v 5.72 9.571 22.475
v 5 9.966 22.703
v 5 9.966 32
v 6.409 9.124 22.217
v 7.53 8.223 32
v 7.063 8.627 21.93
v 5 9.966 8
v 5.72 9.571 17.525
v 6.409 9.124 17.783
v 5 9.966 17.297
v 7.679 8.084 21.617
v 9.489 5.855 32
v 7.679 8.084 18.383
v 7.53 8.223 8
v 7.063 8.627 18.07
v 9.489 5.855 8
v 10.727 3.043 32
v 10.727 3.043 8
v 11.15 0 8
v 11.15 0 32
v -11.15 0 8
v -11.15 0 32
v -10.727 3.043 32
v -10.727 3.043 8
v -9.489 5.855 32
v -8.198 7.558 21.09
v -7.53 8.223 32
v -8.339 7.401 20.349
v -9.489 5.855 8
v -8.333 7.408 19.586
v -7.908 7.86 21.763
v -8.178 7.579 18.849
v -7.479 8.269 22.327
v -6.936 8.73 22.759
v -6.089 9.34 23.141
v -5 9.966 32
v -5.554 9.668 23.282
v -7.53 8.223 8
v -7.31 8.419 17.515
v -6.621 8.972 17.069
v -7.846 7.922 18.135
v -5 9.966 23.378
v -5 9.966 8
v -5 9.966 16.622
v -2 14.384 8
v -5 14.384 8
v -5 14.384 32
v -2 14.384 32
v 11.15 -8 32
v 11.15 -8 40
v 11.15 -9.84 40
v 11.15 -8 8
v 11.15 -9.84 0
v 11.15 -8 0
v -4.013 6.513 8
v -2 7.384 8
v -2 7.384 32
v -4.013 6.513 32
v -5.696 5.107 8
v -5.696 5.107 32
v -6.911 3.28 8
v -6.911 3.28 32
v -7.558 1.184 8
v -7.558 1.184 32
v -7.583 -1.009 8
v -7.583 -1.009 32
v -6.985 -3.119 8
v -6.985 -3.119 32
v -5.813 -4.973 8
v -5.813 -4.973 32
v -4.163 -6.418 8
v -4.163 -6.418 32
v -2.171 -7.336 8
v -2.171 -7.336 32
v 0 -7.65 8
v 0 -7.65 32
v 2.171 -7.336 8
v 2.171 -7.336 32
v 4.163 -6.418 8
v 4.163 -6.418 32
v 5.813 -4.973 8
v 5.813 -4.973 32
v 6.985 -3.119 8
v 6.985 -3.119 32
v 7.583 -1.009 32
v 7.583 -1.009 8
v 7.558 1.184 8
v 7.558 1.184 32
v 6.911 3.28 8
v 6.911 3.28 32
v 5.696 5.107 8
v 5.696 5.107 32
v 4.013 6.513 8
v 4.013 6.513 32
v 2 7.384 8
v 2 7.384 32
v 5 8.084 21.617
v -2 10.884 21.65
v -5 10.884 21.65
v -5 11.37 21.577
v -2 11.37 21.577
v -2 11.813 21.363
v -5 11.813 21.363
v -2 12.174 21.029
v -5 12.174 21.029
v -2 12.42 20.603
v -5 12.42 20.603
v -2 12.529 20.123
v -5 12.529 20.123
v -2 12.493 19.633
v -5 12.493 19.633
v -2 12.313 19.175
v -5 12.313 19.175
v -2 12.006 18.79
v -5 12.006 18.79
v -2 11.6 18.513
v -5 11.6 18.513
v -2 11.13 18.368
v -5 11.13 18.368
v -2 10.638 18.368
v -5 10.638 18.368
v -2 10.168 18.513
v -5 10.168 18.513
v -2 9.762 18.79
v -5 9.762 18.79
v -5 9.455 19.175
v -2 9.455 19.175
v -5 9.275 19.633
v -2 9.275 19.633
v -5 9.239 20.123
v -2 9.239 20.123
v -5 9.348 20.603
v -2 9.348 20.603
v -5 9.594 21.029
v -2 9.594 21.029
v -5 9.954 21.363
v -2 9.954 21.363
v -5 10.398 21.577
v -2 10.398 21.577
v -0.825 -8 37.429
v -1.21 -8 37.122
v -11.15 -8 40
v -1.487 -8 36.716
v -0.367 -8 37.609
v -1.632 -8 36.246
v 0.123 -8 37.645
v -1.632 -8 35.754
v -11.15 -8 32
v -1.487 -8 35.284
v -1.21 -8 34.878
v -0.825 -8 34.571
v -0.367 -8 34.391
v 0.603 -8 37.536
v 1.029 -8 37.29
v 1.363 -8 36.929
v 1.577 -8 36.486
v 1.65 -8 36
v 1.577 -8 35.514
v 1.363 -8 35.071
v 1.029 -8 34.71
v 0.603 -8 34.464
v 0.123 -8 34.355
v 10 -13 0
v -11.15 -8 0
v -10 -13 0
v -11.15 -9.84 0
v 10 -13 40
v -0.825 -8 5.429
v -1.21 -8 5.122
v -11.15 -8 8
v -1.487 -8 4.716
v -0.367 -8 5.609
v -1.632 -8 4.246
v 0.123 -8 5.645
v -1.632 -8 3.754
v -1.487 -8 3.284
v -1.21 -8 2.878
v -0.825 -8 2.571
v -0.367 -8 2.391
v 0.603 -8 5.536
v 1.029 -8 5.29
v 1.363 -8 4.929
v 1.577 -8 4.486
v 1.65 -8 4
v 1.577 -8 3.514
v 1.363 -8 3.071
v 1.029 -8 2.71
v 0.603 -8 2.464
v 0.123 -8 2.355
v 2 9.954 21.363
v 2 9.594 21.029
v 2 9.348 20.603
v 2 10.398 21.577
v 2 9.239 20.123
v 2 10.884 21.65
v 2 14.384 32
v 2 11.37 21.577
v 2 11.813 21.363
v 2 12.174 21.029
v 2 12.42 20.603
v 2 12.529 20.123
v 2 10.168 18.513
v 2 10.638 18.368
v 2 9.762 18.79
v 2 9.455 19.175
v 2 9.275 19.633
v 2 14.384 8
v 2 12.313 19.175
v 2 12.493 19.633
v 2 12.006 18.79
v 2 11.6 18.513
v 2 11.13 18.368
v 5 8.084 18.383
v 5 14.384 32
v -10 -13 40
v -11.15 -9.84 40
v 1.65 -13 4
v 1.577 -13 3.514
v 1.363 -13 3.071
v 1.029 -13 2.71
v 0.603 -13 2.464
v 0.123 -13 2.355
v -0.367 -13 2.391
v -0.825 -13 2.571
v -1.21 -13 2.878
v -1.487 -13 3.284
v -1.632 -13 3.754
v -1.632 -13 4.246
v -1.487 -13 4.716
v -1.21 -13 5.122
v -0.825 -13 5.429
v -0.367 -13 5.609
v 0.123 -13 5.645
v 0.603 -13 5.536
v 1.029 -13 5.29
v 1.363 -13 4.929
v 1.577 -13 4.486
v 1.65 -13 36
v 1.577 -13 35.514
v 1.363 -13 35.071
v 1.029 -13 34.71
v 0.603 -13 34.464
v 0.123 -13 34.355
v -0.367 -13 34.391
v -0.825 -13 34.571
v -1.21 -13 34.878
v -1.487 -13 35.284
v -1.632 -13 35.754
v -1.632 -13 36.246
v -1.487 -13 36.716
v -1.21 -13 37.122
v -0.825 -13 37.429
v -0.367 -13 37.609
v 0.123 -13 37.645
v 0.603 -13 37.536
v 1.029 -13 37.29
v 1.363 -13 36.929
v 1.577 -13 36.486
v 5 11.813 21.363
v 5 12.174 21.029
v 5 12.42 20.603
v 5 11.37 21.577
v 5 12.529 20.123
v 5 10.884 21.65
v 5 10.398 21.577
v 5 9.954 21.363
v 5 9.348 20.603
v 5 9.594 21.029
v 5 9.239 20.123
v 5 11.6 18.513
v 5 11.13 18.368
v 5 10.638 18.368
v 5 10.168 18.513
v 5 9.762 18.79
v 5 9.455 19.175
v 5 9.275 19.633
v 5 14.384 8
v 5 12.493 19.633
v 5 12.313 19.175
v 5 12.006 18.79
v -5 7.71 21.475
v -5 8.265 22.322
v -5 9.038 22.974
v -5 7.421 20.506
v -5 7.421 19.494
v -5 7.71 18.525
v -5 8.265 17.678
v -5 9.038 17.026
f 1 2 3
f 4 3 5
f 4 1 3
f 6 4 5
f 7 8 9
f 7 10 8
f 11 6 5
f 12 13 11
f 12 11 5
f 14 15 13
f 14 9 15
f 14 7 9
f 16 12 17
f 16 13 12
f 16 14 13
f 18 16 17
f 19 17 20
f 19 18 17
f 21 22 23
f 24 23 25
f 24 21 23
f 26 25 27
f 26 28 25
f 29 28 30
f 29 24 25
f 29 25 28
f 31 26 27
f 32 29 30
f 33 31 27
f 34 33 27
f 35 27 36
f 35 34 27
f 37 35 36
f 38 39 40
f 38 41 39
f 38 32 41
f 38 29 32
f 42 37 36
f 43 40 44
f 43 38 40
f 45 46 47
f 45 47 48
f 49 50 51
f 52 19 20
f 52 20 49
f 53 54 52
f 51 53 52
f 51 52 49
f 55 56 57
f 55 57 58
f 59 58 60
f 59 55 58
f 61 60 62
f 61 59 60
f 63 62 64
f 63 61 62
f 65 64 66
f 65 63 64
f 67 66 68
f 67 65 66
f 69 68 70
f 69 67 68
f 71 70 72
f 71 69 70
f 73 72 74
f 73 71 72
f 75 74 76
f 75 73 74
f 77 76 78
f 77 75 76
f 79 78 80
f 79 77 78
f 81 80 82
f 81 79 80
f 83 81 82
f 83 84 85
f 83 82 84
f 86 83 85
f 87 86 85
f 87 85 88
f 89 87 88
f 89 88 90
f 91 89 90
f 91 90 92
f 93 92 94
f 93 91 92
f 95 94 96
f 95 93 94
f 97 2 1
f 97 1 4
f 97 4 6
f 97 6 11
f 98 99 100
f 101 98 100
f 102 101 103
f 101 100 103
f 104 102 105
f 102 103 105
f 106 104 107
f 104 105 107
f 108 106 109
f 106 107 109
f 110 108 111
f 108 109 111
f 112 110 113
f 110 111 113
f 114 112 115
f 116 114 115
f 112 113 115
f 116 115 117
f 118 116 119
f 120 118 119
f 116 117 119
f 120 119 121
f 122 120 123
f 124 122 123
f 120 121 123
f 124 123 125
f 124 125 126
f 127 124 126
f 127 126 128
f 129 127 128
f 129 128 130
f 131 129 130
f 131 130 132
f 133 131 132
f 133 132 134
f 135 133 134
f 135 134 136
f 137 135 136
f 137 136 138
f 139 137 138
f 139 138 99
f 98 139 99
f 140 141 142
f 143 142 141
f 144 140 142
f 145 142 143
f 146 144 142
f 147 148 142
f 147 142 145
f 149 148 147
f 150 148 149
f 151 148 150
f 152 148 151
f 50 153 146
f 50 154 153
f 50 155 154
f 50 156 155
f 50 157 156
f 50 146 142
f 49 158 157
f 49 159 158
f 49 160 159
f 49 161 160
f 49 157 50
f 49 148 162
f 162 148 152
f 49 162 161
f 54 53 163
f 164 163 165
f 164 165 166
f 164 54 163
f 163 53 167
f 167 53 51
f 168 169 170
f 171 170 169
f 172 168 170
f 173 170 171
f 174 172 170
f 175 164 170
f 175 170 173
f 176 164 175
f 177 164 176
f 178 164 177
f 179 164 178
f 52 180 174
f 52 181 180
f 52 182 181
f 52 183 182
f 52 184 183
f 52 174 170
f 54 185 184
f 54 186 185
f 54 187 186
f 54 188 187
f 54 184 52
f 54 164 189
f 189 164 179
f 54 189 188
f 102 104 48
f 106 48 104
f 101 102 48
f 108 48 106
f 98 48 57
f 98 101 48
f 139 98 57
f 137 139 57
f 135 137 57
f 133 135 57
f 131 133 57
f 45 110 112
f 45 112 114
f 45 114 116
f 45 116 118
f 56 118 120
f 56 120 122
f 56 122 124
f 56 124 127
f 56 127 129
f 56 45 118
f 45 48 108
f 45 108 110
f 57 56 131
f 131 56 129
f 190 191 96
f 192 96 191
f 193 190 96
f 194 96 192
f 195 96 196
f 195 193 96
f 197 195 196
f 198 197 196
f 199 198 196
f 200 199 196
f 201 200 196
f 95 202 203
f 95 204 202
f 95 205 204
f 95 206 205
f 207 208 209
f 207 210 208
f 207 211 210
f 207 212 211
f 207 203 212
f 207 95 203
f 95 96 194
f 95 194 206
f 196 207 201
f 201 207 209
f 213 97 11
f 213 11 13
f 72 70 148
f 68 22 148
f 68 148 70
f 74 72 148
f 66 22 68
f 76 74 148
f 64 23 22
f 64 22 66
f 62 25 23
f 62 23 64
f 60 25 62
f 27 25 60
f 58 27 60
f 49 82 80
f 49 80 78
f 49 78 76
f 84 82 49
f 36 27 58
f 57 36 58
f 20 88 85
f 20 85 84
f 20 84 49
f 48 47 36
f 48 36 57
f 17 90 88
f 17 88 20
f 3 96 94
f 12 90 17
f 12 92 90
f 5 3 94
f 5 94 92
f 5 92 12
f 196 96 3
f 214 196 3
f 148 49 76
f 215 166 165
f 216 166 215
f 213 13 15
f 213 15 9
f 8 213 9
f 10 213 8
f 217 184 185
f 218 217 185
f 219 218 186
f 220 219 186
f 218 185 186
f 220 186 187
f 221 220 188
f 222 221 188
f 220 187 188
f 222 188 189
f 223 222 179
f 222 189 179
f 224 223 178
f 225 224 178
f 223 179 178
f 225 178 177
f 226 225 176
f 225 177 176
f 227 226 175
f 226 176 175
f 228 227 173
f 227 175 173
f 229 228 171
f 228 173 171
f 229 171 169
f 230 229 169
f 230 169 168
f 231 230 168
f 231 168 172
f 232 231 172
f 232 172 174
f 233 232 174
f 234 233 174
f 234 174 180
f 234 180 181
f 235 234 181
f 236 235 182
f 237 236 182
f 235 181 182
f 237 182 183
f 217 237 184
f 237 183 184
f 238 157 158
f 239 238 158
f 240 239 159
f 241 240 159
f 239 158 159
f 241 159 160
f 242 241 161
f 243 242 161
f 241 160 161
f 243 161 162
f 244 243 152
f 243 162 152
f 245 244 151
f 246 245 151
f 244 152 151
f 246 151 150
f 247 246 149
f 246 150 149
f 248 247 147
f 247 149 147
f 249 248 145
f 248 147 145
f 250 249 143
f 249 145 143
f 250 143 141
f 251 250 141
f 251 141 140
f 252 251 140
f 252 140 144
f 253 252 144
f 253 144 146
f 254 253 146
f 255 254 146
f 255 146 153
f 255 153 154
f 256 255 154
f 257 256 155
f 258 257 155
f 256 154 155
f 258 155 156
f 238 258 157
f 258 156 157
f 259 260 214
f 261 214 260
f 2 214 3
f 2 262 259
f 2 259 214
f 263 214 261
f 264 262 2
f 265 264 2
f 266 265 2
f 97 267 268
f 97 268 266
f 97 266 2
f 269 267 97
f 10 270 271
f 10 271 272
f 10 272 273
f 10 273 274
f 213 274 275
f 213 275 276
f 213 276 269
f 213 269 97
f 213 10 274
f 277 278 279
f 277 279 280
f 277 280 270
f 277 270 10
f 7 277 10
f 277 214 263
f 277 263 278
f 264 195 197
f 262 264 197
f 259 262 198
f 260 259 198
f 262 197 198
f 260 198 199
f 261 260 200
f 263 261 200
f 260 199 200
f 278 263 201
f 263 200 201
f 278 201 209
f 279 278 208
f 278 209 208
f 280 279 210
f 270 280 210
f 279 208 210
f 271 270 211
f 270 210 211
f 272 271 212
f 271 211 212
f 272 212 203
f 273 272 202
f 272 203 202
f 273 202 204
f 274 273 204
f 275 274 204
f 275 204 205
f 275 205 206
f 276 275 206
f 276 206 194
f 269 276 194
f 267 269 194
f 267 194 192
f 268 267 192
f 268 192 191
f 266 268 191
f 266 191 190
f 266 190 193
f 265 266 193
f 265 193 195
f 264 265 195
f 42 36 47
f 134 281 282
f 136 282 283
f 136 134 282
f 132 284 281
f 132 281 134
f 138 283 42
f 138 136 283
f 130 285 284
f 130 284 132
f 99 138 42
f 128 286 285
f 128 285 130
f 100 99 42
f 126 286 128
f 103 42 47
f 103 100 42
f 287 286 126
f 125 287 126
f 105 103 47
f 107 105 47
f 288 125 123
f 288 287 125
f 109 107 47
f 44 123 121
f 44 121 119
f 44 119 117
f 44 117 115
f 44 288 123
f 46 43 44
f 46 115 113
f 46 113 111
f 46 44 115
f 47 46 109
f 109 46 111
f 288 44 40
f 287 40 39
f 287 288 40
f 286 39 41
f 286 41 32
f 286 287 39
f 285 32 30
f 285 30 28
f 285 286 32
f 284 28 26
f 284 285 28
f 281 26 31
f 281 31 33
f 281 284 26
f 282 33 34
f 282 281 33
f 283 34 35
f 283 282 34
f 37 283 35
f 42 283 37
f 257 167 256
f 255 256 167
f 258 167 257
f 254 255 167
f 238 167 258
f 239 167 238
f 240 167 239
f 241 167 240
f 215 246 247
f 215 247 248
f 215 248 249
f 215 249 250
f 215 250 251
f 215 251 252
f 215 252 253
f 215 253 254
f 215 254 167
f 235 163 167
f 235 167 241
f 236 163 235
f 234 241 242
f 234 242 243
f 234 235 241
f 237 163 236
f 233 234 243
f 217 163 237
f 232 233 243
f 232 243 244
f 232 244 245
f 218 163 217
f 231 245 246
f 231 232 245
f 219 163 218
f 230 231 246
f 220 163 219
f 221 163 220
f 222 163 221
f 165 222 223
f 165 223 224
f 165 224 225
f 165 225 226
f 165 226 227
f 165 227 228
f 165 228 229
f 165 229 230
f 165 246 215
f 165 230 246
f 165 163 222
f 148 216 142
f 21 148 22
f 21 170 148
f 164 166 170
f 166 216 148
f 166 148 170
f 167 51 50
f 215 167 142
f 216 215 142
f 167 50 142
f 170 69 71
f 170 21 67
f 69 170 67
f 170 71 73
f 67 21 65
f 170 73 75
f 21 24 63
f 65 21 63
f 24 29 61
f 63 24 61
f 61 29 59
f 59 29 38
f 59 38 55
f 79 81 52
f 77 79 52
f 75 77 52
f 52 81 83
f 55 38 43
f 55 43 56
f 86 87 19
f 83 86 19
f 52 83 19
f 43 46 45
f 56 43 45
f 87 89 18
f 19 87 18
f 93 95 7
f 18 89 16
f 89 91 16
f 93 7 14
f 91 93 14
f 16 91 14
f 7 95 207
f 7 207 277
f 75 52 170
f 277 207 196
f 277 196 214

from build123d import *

# Parameters (mm, degrees)
RESSALTO_EXTRUS_O1_DEPTH   = 40
ESBO_O2_W                  = 22.3
ESBO_O2_H                  = 8
CORTE_EXTRUS_O1_DEPTH      = 22.383935
ESBO_O3_R                  = 1.65
CORTE_EXTRUS_O2_DEPTH      = 5
ESBO_O4_R                  = 1.65
CORTE_EXTRUS_O3_DEPTH      = 7.15
CORTE_EXTRUS_O3_DEPTH_BACK = 17.15
ESBO_O5_R                  = 3.5
CORTE_EXTRUS_O4_DEPTH      = 10
CORTE_EXTRUS_O5_DEPTH      = 10
CHANFRO1_SIZE              = 1.15
CHANFRO1_SIZE2             = 3.159599032


with BuildPart() as part:
    # Esboço1 → Ressalto-extrusão1 (new body)
    with BuildSketch(Plane.XY):
        with BuildLine():
            Line((5, 14.383935265), (5, 9.966067429))
            ThreePointArc((5, 9.966067429), (9.488743331, 5.855446183), (11.15, 0))
            Line((11.15, 0), (11.15, -13))
            Line((11.15, -13), (-11.15, -13))
            Line((-11.15, -13), (-11.15, 0))
            ThreePointArc((-11.15, 0), (-9.488743331, 5.855446183), (-5, 9.966067429))
            Line((-5, 9.966067429), (-5, 14.383935265))
            Line((-5, 14.383935265), (-2, 14.383935265))
            Line((-2, 14.383935265), (-2, 7.383935265))
            ThreePointArc((-2, 7.383935265), (0, -7.65), (2, 7.383935265))
            Line((2, 7.383935265), (2, 14.383935265))
            Line((2, 14.383935265), (5, 14.383935265))
        make_face()
    extrude(amount=RESSALTO_EXTRUS_O1_DEPTH)

    # Esboço2 → Corte-extrusão1 (cut)
    with BuildSketch(Plane(origin=(0, 14.383935265, 0), x_dir=(1, 0, 0), z_dir=(0, 1, 0))):
        with Locations((0, -36)):
            Rectangle(ESBO_O2_W, ESBO_O2_H)
        with Locations((0, -4)):
            Rectangle(ESBO_O2_W, ESBO_O2_H)
    extrude(amount=-CORTE_EXTRUS_O1_DEPTH, mode=Mode.SUBTRACT)

    # Esboço3 → Corte-extrusão2 (cut)
    with BuildSketch(Plane(origin=(0, -8, 0), x_dir=(1, 0, 0), z_dir=(0, 1, 0))):
        with Locations((0, -4)):
            Circle(ESBO_O3_R)
        with Locations((0, -36)):
            Circle(ESBO_O3_R)
    extrude(amount=-CORTE_EXTRUS_O2_DEPTH, mode=Mode.SUBTRACT)

    # Esboço4 → Corte-extrusão3 (cut, two sides)
    with BuildSketch(Plane.ZY.offset(5)) as corte_extrus_o3_sk:
        with Locations((20, 10.883935265)):
            Circle(ESBO_O4_R)
    extrude(amount=CORTE_EXTRUS_O3_DEPTH, mode=Mode.SUBTRACT)
    extrude(corte_extrus_o3_sk.sketch, amount=-CORTE_EXTRUS_O3_DEPTH_BACK, mode=Mode.SUBTRACT)

    # Esboço5 → Corte-extrusão4 (cut)
    with BuildSketch(Plane.ZY.offset(5)):
        with Locations((20, 10.883935265)):
            Circle(ESBO_O5_R)
    extrude(amount=CORTE_EXTRUS_O4_DEPTH, mode=Mode.SUBTRACT)

    # Esboço6 → Corte-extrusão5 (cut)
    with BuildSketch(Plane(origin=(5, 0, 0), x_dir=(0, 0, -1), z_dir=(1, 0, 0))):
        Polygon((-16.766838493, 10.883935265), (-18.383419246, 13.683935265), (-21.616580754, 13.683935265), (-23.233161507, 10.883935265), (-21.616580754, 8.083935265), (-18.383419246, 8.083935265), align=None)
    extrude(amount=CORTE_EXTRUS_O5_DEPTH, mode=Mode.SUBTRACT)

    # Chanfro1
    chanfro1_edges = [part.edges().sort_by_distance(p)[0] for p in [
        (11.15, -13, 20),
        (-11.15, -13, 20),
    ]]
    chanfro1_side = [part.faces().sort_by_distance(p)[0] for p in [
        (0, -13, 20),
    ]]
    chamfer(chanfro1_edges, length=CHANFRO1_SIZE, length2=CHANFRO1_SIZE2, reference=chanfro1_side[0])


solid = part.part
